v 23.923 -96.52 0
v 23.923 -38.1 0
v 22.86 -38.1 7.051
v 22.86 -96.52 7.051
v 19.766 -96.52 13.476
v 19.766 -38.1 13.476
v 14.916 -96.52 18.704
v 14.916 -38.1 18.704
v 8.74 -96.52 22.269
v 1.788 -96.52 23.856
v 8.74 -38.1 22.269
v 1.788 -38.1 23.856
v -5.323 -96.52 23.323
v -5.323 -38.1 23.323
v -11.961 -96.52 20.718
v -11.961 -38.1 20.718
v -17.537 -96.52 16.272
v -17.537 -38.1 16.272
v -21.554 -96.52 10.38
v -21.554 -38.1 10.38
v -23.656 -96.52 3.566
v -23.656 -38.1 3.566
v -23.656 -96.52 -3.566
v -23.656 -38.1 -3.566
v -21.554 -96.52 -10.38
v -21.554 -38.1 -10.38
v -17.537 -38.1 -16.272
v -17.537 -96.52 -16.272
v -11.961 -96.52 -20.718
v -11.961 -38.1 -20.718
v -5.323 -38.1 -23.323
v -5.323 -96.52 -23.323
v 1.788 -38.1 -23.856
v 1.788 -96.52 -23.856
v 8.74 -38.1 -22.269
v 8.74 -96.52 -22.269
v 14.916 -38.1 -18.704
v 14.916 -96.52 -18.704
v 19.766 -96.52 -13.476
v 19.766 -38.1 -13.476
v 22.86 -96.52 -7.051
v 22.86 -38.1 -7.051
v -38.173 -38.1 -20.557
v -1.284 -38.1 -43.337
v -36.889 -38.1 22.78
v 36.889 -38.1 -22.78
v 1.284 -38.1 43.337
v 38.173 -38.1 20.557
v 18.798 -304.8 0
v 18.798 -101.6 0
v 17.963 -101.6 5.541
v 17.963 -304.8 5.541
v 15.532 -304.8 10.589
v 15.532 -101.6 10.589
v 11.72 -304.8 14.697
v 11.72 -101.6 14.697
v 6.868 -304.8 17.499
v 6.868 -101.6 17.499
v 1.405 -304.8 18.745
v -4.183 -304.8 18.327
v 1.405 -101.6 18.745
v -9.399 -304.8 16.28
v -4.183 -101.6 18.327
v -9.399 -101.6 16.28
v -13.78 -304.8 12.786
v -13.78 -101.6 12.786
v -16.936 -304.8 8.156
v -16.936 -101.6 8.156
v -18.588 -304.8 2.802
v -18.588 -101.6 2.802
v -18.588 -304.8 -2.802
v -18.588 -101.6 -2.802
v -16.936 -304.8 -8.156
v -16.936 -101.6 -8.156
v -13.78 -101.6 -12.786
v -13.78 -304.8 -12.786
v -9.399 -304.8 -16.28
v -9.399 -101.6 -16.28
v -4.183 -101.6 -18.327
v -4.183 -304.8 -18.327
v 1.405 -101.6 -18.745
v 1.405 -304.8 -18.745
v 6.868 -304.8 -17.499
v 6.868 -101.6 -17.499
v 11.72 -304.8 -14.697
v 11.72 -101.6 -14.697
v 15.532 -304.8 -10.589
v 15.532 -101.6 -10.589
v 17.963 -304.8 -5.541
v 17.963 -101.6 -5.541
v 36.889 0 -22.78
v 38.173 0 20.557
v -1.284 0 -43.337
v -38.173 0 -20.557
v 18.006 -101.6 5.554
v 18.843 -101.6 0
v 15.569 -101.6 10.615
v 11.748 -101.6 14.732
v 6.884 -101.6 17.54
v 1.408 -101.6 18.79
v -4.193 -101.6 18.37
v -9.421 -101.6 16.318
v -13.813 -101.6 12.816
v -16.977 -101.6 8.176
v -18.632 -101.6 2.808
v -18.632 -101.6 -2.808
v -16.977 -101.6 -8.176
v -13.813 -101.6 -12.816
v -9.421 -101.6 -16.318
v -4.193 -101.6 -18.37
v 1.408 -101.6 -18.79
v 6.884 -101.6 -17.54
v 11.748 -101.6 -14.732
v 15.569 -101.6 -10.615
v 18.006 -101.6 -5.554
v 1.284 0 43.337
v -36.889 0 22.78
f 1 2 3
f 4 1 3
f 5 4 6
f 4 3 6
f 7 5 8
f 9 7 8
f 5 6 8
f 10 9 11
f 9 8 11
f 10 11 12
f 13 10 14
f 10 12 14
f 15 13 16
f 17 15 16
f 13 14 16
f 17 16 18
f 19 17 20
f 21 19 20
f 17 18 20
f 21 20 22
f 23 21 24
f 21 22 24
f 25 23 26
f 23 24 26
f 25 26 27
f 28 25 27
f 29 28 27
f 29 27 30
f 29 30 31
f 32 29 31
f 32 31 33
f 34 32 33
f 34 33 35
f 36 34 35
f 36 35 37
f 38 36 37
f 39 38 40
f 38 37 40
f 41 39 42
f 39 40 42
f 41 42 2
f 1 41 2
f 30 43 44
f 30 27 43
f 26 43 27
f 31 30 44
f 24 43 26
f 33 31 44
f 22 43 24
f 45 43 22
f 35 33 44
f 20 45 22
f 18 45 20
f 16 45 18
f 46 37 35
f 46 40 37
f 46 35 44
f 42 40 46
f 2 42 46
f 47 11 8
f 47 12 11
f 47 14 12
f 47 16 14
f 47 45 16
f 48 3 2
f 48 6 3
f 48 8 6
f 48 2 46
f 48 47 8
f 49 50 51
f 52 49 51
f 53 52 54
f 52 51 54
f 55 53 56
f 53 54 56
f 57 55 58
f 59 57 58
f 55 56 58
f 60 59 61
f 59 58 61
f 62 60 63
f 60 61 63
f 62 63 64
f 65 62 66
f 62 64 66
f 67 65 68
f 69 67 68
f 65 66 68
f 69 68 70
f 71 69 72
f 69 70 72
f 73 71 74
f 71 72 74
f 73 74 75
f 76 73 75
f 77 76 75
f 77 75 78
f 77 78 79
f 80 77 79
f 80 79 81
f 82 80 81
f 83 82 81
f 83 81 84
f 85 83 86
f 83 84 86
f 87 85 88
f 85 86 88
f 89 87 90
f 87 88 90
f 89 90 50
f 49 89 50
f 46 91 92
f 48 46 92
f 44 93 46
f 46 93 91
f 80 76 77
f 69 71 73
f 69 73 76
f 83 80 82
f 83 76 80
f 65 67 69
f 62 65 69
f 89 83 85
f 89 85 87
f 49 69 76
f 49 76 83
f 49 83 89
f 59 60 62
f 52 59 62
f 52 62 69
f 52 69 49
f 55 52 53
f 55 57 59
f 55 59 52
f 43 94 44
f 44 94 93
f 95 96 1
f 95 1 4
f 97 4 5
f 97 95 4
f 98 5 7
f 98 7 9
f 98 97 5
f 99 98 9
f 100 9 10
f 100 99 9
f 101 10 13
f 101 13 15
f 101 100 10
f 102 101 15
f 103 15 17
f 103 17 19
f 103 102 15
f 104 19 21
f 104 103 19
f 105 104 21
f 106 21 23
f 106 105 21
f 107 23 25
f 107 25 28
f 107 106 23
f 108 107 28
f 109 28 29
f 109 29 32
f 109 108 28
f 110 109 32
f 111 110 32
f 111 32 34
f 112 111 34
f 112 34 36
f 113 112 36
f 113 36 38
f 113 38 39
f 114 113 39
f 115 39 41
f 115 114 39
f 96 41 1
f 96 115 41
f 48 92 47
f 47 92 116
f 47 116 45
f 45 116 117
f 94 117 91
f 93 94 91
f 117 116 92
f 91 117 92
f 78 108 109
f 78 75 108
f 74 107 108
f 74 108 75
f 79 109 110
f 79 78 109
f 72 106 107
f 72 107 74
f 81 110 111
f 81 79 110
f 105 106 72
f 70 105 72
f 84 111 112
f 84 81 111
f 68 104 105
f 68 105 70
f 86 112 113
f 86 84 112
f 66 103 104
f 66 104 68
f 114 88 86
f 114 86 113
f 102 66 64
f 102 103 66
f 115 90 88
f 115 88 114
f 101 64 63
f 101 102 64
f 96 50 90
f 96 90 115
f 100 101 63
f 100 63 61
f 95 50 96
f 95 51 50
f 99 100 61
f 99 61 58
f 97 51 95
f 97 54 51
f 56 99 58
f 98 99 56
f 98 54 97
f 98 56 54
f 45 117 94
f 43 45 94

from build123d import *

# Parameters (mm, degrees)
F1_DEPTH = 38.1
F2_R     = 23.922901
F3_DEPTH = 63.5
F4_SIZE  = 5.08
F5_R     = 18.798033
F6_DEPTH = 203.2


with BuildPart() as f1:
    # F0 (on Front) → F1 (new body)
    with BuildSketch(Plane.XZ):
        Polygon((1.283812, 43.336898), (-36.888948, 22.780262), (-38.17276, -20.556635), (-1.283812, -43.336898), (36.888948, -22.780262), (38.17276, 20.556635), align=None)
    extrude(amount=F1_DEPTH)

    # F2 (on face) → F3 (join)
    with BuildSketch(Plane.XZ.offset(38.1)):
        Circle(F2_R)
    extrude(amount=F3_DEPTH)

    # F4
    f4_edges = [f1.edges().sort_by_distance(p)[0] for p in [
        (-23.922901, -101.6, 0),
    ]]
    chamfer(f4_edges, length=F4_SIZE)

    # F5 (on face) → F6 (join)
    with BuildSketch(Plane.XZ.offset(101.6)):
        Circle(F5_R)
    extrude(amount=F6_DEPTH)


solid = f1.part
